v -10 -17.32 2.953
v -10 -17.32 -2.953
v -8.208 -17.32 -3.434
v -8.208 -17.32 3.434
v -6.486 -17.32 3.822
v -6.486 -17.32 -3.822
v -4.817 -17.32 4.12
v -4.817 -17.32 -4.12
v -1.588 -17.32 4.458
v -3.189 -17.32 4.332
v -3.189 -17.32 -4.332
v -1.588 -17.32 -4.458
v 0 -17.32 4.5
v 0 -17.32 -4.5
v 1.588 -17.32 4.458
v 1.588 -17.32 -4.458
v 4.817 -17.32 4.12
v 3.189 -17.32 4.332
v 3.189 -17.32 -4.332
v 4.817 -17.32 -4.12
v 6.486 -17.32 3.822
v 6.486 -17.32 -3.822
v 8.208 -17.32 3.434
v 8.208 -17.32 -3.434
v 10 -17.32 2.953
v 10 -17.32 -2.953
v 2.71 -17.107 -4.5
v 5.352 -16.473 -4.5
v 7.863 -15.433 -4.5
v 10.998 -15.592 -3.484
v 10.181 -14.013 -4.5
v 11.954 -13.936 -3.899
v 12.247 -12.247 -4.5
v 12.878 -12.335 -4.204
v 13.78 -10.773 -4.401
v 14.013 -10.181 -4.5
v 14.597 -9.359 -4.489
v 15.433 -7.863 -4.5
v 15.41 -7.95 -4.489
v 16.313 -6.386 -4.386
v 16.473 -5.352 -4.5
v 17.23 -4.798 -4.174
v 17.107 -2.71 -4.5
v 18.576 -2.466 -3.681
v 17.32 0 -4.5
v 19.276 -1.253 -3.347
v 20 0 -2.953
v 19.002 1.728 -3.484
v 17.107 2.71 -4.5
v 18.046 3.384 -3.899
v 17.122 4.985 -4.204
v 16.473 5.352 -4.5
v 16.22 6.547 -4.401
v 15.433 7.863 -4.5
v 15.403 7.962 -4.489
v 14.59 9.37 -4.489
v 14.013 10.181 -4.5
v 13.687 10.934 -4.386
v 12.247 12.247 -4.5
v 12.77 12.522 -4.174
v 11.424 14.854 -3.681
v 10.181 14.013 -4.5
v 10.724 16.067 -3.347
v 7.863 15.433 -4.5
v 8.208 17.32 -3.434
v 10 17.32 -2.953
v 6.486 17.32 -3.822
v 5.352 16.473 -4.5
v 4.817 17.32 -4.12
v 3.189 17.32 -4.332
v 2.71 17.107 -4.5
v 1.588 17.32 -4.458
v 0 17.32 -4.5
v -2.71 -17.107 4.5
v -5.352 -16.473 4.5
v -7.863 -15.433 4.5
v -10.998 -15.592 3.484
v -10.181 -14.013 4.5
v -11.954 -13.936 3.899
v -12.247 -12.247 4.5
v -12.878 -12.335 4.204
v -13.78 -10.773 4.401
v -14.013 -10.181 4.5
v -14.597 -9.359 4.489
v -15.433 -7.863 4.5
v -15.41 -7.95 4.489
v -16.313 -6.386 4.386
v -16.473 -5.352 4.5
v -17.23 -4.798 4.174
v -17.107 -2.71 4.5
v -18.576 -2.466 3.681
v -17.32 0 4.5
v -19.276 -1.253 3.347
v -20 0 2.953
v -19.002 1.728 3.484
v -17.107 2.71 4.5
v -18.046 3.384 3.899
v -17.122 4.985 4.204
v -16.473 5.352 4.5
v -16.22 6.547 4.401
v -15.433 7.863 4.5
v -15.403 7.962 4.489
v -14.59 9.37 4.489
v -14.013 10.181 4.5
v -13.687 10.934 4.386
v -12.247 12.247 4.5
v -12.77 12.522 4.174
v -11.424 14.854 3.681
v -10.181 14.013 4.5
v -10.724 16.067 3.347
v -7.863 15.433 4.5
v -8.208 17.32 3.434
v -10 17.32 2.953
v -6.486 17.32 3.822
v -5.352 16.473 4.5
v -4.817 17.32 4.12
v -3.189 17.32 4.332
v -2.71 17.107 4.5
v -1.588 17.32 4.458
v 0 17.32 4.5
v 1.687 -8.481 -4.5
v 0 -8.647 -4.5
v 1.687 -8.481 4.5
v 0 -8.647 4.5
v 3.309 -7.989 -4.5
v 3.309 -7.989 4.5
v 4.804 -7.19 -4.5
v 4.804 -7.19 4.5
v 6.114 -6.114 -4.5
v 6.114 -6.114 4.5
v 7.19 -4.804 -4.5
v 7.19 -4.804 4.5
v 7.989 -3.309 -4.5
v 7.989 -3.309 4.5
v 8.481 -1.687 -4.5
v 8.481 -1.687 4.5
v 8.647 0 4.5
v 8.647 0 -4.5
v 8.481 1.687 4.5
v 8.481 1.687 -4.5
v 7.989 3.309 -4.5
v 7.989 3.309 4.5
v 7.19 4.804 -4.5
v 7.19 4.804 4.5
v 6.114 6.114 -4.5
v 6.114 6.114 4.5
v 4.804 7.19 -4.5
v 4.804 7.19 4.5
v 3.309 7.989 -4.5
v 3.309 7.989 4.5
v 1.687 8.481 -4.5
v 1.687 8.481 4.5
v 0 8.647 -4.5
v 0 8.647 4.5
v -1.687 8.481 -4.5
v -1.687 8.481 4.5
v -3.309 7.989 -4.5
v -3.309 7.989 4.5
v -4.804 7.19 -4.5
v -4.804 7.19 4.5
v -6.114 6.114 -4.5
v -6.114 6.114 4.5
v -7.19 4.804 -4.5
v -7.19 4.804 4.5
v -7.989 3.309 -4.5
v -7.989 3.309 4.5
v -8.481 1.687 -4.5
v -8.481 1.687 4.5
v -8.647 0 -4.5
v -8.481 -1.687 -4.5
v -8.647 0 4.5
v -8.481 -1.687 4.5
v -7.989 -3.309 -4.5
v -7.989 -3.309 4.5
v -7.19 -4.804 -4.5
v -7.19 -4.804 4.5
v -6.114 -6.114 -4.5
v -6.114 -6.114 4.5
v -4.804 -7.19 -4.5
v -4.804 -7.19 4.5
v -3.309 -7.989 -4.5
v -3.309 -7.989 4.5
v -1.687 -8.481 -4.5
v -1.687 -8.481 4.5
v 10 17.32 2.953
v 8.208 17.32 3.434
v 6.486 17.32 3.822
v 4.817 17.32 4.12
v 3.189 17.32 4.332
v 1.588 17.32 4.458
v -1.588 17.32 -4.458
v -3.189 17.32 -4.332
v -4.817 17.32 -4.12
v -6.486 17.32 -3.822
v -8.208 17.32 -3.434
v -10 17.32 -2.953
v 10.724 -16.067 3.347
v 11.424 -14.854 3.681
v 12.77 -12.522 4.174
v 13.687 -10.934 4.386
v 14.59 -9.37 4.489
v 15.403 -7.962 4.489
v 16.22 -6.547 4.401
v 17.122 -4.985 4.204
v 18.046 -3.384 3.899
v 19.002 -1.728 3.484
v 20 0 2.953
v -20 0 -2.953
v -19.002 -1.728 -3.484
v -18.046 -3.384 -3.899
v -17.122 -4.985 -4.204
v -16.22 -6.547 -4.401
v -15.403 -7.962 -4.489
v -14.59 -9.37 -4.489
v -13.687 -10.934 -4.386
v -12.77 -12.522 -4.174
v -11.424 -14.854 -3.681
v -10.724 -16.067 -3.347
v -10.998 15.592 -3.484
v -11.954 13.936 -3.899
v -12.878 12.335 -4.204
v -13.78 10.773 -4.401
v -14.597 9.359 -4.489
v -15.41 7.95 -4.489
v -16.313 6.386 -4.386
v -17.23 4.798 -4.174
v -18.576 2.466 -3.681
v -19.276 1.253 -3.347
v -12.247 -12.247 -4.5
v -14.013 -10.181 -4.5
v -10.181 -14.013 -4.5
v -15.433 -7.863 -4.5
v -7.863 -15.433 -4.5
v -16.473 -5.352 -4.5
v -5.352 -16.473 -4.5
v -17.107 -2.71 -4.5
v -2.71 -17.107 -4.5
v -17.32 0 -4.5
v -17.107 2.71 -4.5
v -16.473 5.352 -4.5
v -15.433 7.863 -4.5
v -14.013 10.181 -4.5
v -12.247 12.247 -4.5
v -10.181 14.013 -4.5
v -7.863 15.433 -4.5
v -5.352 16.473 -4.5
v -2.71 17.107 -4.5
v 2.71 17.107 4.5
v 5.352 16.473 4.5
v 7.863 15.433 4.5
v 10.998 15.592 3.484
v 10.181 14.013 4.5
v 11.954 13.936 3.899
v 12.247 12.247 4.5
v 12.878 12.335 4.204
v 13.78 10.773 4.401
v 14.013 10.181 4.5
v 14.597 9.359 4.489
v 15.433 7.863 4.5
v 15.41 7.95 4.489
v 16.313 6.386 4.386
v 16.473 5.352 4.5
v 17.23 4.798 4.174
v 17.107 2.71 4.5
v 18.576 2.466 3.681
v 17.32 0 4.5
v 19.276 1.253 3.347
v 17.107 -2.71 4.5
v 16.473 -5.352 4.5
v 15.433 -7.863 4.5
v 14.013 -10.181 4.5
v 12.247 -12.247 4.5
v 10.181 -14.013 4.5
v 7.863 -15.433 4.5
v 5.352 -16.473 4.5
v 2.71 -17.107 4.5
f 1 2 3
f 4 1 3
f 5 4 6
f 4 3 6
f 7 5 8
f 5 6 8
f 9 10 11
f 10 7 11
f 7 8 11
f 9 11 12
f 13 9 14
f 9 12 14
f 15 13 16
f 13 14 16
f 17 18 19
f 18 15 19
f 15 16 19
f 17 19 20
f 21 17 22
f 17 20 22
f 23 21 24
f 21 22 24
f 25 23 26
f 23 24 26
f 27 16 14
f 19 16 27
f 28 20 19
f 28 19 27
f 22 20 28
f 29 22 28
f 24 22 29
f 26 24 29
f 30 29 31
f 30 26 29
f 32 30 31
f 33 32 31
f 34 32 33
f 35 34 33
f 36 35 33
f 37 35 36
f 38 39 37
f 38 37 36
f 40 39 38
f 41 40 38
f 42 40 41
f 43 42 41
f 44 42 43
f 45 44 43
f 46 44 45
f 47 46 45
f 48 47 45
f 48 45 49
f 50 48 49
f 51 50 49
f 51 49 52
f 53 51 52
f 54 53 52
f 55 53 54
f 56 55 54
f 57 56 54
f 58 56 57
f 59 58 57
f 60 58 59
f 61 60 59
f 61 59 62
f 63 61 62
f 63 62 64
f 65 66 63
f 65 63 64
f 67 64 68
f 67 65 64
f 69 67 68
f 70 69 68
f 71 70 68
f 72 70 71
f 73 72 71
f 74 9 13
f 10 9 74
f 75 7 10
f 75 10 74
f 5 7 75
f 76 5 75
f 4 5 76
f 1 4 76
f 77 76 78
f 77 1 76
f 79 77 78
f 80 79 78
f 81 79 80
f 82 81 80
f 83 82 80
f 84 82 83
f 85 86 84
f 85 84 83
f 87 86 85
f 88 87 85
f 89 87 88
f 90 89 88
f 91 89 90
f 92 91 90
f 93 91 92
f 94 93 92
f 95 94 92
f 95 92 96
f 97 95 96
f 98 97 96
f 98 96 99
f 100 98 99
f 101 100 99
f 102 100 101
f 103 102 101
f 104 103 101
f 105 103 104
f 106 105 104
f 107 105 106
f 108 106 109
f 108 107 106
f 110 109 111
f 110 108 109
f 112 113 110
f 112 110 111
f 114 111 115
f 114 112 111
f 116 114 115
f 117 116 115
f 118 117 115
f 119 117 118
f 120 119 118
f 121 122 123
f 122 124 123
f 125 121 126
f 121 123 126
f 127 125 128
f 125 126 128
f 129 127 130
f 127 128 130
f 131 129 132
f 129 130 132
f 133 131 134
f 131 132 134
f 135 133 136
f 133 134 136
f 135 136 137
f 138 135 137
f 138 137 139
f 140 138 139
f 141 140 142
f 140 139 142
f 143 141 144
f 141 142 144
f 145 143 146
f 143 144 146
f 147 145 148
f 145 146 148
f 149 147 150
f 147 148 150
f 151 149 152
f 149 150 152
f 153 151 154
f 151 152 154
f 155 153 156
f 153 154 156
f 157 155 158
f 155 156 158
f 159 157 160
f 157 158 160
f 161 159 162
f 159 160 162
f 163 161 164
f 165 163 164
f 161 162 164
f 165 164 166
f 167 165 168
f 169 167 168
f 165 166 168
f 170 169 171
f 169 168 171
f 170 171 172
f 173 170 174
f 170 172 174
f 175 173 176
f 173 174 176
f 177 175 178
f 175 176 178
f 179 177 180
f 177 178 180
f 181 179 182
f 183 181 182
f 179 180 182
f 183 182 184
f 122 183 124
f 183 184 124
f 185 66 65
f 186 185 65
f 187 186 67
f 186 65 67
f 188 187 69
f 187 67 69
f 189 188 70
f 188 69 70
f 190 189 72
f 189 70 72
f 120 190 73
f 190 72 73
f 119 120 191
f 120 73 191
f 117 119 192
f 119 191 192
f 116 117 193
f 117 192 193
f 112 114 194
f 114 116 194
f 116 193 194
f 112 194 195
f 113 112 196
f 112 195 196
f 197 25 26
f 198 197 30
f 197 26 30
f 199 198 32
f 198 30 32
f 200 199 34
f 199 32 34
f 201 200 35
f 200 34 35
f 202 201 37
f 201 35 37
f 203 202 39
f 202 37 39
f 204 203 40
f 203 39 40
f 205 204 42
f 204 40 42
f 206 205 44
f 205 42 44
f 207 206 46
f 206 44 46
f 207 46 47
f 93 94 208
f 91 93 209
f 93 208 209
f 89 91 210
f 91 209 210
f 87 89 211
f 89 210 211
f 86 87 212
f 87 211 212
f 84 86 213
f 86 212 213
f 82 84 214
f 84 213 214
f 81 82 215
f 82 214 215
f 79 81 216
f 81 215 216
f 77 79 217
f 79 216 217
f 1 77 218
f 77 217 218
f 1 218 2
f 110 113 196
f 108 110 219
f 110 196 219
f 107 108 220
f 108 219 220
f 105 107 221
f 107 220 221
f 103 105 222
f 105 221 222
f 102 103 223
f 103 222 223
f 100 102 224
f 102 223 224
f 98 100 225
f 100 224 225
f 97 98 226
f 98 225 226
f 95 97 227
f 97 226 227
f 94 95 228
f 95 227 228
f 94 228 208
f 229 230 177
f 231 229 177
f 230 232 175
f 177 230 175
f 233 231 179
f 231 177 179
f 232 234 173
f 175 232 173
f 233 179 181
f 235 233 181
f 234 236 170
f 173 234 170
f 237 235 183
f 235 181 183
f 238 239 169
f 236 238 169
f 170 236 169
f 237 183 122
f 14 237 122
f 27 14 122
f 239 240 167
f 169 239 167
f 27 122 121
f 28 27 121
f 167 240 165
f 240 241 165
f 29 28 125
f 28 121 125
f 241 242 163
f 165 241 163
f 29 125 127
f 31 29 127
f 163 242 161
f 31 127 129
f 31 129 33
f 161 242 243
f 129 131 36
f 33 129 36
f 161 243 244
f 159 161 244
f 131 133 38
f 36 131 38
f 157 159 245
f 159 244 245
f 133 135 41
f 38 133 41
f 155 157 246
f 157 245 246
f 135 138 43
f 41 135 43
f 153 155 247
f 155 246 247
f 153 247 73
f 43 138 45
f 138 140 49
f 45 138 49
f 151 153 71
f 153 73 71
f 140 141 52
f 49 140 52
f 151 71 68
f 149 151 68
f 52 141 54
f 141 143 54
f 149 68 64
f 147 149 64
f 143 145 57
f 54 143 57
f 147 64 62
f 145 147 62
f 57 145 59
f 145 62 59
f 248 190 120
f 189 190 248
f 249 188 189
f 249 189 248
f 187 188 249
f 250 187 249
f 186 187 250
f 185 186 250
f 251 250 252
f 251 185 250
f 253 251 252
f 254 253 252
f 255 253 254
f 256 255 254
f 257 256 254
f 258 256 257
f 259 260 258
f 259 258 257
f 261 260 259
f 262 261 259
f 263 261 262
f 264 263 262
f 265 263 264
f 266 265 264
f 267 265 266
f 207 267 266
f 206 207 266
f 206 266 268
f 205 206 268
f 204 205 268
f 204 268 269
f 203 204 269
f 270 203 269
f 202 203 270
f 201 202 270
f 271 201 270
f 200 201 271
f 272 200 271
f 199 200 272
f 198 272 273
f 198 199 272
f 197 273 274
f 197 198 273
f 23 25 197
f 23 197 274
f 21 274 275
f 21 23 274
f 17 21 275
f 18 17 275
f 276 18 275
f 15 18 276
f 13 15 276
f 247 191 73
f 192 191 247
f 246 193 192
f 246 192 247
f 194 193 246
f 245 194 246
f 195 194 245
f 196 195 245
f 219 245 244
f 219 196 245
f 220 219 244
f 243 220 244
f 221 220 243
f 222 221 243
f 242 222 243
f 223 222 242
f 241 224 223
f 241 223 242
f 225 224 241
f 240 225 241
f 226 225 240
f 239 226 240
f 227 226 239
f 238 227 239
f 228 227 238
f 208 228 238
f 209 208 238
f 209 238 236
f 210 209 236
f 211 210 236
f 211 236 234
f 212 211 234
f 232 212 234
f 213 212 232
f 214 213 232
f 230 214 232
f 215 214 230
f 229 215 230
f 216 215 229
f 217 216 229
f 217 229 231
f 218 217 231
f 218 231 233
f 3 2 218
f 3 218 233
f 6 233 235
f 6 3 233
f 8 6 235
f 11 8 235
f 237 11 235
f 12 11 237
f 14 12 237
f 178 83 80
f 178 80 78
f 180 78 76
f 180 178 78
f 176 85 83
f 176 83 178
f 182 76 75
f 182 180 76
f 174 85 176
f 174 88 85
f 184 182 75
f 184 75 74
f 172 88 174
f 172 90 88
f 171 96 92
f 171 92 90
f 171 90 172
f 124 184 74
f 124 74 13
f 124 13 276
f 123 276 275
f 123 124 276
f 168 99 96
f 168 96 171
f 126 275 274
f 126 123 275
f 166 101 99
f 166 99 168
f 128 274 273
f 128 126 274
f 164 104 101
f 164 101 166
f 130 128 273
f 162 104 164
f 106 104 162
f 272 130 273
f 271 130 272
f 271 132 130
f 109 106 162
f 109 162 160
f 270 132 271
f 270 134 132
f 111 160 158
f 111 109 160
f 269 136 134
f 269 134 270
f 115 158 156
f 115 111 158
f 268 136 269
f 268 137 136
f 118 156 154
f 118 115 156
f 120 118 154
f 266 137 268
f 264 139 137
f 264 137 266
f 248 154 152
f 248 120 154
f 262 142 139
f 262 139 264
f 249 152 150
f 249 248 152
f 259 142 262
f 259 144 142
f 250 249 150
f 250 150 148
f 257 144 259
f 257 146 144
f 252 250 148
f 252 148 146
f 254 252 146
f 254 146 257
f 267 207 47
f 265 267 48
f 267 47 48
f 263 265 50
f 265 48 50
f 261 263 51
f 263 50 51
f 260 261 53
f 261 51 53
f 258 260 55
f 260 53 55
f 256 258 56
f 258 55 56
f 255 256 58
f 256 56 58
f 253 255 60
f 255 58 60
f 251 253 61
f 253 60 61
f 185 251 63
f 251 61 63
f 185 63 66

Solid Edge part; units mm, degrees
sketch "Sketch1" plane through (0, 0, 0) normal (0, 0, 1) x (1, 0, 0)
  line L0 (-10, -17.3205) -> (10, -17.3205)
  line L1 (10, -17.3205) -> (20, 0)
  line L2 (20, 0) -> (10, 17.3205)
  line L3 (10, 17.3205) -> (-10, 17.3205)
  line L4 (-10, 17.3205) -> (-20, 0)
  line L5 (-20, 0) -> (-10, -17.3205)
  dimension "D1" = 20
extrude "Protrusion1" add sketch "Sketch1" along normal mid plane 9
hole "Hole_1" at (0, 0, 4.5) direction (0, 0, -1) diameter 17.294 end through all
sketch "Sketch2" plane through (0, 0, 0) normal (1, 0, 0) x (0, 1, 0)
  line L0 (17.3205, -4.5) -> (44.5217, 11.2046)
revolve "RevolvedCutout1" cut sketch "Sketch2" angle 360 about axis through (0, 0, -57) along (0, 0, 1) material side at (0, 30.9461, 3.309)
mirror "Mirror1" about plane through (0, 0, 0) normal (0, 0, 1) of "RevolvedCutout1"
properties part number "5" material "Fe 410 W"
